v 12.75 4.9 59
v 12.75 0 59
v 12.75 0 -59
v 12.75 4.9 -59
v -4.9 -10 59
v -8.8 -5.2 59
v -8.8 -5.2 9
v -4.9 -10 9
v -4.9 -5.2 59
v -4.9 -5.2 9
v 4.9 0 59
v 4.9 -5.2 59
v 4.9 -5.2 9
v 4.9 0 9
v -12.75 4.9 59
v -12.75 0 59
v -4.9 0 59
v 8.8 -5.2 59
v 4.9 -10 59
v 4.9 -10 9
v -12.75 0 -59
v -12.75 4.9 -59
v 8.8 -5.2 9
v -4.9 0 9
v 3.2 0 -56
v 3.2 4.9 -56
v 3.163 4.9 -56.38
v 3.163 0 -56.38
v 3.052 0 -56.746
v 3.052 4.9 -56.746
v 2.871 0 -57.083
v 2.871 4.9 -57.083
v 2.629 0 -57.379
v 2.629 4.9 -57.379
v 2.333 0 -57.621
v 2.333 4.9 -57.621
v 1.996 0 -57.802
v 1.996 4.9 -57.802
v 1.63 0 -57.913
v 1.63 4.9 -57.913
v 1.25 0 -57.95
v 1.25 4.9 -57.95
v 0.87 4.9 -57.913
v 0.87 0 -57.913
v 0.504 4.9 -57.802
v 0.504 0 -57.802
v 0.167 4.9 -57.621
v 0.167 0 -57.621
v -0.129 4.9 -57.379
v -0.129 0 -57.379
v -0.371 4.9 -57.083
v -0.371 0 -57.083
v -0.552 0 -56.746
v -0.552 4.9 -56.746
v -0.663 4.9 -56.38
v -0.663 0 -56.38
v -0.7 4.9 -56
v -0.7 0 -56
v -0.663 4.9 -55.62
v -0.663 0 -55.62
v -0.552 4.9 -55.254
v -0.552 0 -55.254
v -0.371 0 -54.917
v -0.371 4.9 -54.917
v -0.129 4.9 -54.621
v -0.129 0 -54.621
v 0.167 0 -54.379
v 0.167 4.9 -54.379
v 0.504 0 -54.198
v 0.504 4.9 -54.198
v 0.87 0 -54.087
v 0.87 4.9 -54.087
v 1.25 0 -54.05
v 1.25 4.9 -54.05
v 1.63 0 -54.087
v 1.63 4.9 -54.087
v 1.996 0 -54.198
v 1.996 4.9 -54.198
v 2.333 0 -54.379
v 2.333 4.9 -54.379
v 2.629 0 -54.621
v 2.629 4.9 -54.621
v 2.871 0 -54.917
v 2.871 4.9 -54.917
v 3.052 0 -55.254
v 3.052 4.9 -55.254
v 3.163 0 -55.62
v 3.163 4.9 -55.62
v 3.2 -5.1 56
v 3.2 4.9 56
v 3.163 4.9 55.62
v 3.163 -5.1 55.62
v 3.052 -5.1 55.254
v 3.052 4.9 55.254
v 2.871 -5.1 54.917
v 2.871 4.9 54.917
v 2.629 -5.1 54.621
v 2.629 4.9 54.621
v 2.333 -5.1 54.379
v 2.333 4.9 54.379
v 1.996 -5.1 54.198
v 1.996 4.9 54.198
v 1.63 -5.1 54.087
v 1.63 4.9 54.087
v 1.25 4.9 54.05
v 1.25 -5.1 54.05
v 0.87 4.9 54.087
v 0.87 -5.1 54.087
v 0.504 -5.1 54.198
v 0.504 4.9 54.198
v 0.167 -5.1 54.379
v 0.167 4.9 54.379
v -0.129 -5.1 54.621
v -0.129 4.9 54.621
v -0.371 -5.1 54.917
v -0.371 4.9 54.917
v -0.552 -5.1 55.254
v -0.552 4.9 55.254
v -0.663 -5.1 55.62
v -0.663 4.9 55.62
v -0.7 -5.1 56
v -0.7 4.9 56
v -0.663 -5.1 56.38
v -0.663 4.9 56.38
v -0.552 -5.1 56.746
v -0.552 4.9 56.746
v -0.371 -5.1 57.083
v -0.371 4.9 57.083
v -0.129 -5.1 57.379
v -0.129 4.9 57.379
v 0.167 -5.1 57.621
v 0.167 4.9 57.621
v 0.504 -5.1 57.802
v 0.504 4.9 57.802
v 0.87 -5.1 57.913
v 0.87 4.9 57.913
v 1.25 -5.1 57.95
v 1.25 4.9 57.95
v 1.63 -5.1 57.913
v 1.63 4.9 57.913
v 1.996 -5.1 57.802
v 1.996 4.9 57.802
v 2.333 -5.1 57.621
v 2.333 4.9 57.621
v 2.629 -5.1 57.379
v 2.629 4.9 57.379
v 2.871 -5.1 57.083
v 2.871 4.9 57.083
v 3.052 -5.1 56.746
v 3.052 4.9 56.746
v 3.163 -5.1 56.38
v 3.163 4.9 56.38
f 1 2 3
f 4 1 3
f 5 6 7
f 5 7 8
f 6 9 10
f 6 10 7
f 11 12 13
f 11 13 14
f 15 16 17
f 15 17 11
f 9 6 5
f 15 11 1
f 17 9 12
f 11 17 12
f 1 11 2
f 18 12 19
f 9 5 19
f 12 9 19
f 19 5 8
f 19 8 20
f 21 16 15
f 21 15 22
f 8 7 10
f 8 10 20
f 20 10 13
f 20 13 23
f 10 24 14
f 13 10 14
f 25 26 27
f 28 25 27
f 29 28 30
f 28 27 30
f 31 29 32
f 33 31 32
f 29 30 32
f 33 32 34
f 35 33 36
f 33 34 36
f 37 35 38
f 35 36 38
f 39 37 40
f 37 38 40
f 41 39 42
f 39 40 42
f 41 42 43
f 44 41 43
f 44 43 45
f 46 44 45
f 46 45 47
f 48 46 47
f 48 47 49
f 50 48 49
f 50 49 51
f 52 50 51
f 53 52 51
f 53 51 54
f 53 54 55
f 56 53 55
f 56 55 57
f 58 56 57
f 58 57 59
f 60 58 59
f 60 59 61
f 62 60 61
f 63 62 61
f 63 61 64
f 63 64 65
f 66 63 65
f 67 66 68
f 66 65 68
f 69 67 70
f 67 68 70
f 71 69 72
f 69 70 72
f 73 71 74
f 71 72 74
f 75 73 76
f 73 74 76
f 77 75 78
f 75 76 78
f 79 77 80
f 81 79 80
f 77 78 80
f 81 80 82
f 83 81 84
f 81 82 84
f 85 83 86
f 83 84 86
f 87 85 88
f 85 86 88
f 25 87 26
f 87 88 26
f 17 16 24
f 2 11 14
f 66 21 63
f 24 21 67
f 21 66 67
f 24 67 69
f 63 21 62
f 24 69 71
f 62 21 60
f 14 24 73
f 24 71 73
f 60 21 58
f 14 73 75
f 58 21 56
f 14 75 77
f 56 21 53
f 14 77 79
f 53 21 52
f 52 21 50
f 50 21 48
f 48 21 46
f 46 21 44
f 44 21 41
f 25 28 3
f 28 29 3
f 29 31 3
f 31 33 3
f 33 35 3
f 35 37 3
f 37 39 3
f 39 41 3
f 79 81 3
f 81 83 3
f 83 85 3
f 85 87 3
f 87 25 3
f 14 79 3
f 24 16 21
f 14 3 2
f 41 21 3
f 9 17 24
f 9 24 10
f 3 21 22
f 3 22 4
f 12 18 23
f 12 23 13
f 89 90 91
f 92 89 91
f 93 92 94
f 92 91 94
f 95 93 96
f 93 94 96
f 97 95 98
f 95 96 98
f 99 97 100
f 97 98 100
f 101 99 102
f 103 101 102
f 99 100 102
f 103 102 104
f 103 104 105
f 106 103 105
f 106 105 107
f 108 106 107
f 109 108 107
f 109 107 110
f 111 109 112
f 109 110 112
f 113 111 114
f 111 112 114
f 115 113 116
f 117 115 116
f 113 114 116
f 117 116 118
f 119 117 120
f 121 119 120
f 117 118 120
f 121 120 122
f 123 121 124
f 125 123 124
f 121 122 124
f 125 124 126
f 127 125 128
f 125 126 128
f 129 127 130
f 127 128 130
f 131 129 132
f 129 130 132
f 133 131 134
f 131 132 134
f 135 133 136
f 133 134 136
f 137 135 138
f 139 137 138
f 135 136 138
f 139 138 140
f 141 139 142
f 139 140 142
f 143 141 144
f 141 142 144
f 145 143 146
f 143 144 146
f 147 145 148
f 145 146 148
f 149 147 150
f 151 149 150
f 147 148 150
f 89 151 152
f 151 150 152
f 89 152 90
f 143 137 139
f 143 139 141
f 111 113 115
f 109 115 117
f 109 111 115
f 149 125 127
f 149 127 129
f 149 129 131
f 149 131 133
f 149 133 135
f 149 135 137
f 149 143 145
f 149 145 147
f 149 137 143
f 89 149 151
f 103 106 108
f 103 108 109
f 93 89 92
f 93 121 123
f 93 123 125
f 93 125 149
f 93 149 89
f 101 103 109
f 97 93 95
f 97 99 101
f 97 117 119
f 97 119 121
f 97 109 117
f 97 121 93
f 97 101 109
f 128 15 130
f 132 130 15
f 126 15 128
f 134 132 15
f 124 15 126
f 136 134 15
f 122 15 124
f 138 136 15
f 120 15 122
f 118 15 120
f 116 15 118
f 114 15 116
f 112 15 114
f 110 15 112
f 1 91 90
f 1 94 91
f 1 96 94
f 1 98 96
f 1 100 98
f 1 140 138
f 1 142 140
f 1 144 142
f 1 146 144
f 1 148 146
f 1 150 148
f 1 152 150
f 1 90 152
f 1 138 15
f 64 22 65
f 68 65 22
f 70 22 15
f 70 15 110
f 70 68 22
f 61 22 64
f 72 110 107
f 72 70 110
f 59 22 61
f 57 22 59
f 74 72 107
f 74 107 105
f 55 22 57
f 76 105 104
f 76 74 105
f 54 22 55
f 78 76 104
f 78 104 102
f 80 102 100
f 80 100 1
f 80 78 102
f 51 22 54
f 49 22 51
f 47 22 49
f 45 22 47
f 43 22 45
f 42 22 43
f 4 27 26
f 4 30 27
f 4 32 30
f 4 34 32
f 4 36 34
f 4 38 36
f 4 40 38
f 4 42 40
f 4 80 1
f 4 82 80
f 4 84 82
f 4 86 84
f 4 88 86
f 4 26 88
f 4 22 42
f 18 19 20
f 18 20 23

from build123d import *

# Parameters (mm, degrees)
SKETCH1_W           = 25.5
SKETCH1_H           = 118
BOSS_EXTRUDE1_DEPTH = 4.9
BOSS_EXTRUDE5_DEPTH = 50
SKETCH2_R           = 1.95
CUT_EXTRUDE1_DEPTH  = 10


with BuildPart() as part:
    # Sketch1 → Boss-Extrude1 (new body)
    with BuildSketch(Plane(origin=(0, 0, 0), x_dir=(1, 0, 0), z_dir=(0, 1, 0))):
        Rectangle(SKETCH1_W, SKETCH1_H)
    extrude(amount=BOSS_EXTRUDE1_DEPTH)

    # Sketch5 → Boss-Extrude5 (add)
    with BuildSketch(Plane.XY.offset(59)):
        Polygon((-4.9, 0), (-4.9, -5.2), (-8.8, -5.2), (-4.9, -10), (4.9, -10), (8.8, -5.2), (4.9, -5.2), (4.9, 0), align=None)
    extrude(amount=-BOSS_EXTRUDE5_DEPTH)

    # Sketch2 → Cut-Extrude1 (cut)
    with BuildSketch(Plane(origin=(0, 4.9, 0), x_dir=(1, 0, 0), z_dir=(0, 1, 0))):
        with Locations((1.25, 56)):
            Circle(SKETCH2_R)
        with Locations((1.25, -56)):
            Circle(SKETCH2_R)
    extrude(amount=-CUT_EXTRUDE1_DEPTH, mode=Mode.SUBTRACT)


solid = part.part
